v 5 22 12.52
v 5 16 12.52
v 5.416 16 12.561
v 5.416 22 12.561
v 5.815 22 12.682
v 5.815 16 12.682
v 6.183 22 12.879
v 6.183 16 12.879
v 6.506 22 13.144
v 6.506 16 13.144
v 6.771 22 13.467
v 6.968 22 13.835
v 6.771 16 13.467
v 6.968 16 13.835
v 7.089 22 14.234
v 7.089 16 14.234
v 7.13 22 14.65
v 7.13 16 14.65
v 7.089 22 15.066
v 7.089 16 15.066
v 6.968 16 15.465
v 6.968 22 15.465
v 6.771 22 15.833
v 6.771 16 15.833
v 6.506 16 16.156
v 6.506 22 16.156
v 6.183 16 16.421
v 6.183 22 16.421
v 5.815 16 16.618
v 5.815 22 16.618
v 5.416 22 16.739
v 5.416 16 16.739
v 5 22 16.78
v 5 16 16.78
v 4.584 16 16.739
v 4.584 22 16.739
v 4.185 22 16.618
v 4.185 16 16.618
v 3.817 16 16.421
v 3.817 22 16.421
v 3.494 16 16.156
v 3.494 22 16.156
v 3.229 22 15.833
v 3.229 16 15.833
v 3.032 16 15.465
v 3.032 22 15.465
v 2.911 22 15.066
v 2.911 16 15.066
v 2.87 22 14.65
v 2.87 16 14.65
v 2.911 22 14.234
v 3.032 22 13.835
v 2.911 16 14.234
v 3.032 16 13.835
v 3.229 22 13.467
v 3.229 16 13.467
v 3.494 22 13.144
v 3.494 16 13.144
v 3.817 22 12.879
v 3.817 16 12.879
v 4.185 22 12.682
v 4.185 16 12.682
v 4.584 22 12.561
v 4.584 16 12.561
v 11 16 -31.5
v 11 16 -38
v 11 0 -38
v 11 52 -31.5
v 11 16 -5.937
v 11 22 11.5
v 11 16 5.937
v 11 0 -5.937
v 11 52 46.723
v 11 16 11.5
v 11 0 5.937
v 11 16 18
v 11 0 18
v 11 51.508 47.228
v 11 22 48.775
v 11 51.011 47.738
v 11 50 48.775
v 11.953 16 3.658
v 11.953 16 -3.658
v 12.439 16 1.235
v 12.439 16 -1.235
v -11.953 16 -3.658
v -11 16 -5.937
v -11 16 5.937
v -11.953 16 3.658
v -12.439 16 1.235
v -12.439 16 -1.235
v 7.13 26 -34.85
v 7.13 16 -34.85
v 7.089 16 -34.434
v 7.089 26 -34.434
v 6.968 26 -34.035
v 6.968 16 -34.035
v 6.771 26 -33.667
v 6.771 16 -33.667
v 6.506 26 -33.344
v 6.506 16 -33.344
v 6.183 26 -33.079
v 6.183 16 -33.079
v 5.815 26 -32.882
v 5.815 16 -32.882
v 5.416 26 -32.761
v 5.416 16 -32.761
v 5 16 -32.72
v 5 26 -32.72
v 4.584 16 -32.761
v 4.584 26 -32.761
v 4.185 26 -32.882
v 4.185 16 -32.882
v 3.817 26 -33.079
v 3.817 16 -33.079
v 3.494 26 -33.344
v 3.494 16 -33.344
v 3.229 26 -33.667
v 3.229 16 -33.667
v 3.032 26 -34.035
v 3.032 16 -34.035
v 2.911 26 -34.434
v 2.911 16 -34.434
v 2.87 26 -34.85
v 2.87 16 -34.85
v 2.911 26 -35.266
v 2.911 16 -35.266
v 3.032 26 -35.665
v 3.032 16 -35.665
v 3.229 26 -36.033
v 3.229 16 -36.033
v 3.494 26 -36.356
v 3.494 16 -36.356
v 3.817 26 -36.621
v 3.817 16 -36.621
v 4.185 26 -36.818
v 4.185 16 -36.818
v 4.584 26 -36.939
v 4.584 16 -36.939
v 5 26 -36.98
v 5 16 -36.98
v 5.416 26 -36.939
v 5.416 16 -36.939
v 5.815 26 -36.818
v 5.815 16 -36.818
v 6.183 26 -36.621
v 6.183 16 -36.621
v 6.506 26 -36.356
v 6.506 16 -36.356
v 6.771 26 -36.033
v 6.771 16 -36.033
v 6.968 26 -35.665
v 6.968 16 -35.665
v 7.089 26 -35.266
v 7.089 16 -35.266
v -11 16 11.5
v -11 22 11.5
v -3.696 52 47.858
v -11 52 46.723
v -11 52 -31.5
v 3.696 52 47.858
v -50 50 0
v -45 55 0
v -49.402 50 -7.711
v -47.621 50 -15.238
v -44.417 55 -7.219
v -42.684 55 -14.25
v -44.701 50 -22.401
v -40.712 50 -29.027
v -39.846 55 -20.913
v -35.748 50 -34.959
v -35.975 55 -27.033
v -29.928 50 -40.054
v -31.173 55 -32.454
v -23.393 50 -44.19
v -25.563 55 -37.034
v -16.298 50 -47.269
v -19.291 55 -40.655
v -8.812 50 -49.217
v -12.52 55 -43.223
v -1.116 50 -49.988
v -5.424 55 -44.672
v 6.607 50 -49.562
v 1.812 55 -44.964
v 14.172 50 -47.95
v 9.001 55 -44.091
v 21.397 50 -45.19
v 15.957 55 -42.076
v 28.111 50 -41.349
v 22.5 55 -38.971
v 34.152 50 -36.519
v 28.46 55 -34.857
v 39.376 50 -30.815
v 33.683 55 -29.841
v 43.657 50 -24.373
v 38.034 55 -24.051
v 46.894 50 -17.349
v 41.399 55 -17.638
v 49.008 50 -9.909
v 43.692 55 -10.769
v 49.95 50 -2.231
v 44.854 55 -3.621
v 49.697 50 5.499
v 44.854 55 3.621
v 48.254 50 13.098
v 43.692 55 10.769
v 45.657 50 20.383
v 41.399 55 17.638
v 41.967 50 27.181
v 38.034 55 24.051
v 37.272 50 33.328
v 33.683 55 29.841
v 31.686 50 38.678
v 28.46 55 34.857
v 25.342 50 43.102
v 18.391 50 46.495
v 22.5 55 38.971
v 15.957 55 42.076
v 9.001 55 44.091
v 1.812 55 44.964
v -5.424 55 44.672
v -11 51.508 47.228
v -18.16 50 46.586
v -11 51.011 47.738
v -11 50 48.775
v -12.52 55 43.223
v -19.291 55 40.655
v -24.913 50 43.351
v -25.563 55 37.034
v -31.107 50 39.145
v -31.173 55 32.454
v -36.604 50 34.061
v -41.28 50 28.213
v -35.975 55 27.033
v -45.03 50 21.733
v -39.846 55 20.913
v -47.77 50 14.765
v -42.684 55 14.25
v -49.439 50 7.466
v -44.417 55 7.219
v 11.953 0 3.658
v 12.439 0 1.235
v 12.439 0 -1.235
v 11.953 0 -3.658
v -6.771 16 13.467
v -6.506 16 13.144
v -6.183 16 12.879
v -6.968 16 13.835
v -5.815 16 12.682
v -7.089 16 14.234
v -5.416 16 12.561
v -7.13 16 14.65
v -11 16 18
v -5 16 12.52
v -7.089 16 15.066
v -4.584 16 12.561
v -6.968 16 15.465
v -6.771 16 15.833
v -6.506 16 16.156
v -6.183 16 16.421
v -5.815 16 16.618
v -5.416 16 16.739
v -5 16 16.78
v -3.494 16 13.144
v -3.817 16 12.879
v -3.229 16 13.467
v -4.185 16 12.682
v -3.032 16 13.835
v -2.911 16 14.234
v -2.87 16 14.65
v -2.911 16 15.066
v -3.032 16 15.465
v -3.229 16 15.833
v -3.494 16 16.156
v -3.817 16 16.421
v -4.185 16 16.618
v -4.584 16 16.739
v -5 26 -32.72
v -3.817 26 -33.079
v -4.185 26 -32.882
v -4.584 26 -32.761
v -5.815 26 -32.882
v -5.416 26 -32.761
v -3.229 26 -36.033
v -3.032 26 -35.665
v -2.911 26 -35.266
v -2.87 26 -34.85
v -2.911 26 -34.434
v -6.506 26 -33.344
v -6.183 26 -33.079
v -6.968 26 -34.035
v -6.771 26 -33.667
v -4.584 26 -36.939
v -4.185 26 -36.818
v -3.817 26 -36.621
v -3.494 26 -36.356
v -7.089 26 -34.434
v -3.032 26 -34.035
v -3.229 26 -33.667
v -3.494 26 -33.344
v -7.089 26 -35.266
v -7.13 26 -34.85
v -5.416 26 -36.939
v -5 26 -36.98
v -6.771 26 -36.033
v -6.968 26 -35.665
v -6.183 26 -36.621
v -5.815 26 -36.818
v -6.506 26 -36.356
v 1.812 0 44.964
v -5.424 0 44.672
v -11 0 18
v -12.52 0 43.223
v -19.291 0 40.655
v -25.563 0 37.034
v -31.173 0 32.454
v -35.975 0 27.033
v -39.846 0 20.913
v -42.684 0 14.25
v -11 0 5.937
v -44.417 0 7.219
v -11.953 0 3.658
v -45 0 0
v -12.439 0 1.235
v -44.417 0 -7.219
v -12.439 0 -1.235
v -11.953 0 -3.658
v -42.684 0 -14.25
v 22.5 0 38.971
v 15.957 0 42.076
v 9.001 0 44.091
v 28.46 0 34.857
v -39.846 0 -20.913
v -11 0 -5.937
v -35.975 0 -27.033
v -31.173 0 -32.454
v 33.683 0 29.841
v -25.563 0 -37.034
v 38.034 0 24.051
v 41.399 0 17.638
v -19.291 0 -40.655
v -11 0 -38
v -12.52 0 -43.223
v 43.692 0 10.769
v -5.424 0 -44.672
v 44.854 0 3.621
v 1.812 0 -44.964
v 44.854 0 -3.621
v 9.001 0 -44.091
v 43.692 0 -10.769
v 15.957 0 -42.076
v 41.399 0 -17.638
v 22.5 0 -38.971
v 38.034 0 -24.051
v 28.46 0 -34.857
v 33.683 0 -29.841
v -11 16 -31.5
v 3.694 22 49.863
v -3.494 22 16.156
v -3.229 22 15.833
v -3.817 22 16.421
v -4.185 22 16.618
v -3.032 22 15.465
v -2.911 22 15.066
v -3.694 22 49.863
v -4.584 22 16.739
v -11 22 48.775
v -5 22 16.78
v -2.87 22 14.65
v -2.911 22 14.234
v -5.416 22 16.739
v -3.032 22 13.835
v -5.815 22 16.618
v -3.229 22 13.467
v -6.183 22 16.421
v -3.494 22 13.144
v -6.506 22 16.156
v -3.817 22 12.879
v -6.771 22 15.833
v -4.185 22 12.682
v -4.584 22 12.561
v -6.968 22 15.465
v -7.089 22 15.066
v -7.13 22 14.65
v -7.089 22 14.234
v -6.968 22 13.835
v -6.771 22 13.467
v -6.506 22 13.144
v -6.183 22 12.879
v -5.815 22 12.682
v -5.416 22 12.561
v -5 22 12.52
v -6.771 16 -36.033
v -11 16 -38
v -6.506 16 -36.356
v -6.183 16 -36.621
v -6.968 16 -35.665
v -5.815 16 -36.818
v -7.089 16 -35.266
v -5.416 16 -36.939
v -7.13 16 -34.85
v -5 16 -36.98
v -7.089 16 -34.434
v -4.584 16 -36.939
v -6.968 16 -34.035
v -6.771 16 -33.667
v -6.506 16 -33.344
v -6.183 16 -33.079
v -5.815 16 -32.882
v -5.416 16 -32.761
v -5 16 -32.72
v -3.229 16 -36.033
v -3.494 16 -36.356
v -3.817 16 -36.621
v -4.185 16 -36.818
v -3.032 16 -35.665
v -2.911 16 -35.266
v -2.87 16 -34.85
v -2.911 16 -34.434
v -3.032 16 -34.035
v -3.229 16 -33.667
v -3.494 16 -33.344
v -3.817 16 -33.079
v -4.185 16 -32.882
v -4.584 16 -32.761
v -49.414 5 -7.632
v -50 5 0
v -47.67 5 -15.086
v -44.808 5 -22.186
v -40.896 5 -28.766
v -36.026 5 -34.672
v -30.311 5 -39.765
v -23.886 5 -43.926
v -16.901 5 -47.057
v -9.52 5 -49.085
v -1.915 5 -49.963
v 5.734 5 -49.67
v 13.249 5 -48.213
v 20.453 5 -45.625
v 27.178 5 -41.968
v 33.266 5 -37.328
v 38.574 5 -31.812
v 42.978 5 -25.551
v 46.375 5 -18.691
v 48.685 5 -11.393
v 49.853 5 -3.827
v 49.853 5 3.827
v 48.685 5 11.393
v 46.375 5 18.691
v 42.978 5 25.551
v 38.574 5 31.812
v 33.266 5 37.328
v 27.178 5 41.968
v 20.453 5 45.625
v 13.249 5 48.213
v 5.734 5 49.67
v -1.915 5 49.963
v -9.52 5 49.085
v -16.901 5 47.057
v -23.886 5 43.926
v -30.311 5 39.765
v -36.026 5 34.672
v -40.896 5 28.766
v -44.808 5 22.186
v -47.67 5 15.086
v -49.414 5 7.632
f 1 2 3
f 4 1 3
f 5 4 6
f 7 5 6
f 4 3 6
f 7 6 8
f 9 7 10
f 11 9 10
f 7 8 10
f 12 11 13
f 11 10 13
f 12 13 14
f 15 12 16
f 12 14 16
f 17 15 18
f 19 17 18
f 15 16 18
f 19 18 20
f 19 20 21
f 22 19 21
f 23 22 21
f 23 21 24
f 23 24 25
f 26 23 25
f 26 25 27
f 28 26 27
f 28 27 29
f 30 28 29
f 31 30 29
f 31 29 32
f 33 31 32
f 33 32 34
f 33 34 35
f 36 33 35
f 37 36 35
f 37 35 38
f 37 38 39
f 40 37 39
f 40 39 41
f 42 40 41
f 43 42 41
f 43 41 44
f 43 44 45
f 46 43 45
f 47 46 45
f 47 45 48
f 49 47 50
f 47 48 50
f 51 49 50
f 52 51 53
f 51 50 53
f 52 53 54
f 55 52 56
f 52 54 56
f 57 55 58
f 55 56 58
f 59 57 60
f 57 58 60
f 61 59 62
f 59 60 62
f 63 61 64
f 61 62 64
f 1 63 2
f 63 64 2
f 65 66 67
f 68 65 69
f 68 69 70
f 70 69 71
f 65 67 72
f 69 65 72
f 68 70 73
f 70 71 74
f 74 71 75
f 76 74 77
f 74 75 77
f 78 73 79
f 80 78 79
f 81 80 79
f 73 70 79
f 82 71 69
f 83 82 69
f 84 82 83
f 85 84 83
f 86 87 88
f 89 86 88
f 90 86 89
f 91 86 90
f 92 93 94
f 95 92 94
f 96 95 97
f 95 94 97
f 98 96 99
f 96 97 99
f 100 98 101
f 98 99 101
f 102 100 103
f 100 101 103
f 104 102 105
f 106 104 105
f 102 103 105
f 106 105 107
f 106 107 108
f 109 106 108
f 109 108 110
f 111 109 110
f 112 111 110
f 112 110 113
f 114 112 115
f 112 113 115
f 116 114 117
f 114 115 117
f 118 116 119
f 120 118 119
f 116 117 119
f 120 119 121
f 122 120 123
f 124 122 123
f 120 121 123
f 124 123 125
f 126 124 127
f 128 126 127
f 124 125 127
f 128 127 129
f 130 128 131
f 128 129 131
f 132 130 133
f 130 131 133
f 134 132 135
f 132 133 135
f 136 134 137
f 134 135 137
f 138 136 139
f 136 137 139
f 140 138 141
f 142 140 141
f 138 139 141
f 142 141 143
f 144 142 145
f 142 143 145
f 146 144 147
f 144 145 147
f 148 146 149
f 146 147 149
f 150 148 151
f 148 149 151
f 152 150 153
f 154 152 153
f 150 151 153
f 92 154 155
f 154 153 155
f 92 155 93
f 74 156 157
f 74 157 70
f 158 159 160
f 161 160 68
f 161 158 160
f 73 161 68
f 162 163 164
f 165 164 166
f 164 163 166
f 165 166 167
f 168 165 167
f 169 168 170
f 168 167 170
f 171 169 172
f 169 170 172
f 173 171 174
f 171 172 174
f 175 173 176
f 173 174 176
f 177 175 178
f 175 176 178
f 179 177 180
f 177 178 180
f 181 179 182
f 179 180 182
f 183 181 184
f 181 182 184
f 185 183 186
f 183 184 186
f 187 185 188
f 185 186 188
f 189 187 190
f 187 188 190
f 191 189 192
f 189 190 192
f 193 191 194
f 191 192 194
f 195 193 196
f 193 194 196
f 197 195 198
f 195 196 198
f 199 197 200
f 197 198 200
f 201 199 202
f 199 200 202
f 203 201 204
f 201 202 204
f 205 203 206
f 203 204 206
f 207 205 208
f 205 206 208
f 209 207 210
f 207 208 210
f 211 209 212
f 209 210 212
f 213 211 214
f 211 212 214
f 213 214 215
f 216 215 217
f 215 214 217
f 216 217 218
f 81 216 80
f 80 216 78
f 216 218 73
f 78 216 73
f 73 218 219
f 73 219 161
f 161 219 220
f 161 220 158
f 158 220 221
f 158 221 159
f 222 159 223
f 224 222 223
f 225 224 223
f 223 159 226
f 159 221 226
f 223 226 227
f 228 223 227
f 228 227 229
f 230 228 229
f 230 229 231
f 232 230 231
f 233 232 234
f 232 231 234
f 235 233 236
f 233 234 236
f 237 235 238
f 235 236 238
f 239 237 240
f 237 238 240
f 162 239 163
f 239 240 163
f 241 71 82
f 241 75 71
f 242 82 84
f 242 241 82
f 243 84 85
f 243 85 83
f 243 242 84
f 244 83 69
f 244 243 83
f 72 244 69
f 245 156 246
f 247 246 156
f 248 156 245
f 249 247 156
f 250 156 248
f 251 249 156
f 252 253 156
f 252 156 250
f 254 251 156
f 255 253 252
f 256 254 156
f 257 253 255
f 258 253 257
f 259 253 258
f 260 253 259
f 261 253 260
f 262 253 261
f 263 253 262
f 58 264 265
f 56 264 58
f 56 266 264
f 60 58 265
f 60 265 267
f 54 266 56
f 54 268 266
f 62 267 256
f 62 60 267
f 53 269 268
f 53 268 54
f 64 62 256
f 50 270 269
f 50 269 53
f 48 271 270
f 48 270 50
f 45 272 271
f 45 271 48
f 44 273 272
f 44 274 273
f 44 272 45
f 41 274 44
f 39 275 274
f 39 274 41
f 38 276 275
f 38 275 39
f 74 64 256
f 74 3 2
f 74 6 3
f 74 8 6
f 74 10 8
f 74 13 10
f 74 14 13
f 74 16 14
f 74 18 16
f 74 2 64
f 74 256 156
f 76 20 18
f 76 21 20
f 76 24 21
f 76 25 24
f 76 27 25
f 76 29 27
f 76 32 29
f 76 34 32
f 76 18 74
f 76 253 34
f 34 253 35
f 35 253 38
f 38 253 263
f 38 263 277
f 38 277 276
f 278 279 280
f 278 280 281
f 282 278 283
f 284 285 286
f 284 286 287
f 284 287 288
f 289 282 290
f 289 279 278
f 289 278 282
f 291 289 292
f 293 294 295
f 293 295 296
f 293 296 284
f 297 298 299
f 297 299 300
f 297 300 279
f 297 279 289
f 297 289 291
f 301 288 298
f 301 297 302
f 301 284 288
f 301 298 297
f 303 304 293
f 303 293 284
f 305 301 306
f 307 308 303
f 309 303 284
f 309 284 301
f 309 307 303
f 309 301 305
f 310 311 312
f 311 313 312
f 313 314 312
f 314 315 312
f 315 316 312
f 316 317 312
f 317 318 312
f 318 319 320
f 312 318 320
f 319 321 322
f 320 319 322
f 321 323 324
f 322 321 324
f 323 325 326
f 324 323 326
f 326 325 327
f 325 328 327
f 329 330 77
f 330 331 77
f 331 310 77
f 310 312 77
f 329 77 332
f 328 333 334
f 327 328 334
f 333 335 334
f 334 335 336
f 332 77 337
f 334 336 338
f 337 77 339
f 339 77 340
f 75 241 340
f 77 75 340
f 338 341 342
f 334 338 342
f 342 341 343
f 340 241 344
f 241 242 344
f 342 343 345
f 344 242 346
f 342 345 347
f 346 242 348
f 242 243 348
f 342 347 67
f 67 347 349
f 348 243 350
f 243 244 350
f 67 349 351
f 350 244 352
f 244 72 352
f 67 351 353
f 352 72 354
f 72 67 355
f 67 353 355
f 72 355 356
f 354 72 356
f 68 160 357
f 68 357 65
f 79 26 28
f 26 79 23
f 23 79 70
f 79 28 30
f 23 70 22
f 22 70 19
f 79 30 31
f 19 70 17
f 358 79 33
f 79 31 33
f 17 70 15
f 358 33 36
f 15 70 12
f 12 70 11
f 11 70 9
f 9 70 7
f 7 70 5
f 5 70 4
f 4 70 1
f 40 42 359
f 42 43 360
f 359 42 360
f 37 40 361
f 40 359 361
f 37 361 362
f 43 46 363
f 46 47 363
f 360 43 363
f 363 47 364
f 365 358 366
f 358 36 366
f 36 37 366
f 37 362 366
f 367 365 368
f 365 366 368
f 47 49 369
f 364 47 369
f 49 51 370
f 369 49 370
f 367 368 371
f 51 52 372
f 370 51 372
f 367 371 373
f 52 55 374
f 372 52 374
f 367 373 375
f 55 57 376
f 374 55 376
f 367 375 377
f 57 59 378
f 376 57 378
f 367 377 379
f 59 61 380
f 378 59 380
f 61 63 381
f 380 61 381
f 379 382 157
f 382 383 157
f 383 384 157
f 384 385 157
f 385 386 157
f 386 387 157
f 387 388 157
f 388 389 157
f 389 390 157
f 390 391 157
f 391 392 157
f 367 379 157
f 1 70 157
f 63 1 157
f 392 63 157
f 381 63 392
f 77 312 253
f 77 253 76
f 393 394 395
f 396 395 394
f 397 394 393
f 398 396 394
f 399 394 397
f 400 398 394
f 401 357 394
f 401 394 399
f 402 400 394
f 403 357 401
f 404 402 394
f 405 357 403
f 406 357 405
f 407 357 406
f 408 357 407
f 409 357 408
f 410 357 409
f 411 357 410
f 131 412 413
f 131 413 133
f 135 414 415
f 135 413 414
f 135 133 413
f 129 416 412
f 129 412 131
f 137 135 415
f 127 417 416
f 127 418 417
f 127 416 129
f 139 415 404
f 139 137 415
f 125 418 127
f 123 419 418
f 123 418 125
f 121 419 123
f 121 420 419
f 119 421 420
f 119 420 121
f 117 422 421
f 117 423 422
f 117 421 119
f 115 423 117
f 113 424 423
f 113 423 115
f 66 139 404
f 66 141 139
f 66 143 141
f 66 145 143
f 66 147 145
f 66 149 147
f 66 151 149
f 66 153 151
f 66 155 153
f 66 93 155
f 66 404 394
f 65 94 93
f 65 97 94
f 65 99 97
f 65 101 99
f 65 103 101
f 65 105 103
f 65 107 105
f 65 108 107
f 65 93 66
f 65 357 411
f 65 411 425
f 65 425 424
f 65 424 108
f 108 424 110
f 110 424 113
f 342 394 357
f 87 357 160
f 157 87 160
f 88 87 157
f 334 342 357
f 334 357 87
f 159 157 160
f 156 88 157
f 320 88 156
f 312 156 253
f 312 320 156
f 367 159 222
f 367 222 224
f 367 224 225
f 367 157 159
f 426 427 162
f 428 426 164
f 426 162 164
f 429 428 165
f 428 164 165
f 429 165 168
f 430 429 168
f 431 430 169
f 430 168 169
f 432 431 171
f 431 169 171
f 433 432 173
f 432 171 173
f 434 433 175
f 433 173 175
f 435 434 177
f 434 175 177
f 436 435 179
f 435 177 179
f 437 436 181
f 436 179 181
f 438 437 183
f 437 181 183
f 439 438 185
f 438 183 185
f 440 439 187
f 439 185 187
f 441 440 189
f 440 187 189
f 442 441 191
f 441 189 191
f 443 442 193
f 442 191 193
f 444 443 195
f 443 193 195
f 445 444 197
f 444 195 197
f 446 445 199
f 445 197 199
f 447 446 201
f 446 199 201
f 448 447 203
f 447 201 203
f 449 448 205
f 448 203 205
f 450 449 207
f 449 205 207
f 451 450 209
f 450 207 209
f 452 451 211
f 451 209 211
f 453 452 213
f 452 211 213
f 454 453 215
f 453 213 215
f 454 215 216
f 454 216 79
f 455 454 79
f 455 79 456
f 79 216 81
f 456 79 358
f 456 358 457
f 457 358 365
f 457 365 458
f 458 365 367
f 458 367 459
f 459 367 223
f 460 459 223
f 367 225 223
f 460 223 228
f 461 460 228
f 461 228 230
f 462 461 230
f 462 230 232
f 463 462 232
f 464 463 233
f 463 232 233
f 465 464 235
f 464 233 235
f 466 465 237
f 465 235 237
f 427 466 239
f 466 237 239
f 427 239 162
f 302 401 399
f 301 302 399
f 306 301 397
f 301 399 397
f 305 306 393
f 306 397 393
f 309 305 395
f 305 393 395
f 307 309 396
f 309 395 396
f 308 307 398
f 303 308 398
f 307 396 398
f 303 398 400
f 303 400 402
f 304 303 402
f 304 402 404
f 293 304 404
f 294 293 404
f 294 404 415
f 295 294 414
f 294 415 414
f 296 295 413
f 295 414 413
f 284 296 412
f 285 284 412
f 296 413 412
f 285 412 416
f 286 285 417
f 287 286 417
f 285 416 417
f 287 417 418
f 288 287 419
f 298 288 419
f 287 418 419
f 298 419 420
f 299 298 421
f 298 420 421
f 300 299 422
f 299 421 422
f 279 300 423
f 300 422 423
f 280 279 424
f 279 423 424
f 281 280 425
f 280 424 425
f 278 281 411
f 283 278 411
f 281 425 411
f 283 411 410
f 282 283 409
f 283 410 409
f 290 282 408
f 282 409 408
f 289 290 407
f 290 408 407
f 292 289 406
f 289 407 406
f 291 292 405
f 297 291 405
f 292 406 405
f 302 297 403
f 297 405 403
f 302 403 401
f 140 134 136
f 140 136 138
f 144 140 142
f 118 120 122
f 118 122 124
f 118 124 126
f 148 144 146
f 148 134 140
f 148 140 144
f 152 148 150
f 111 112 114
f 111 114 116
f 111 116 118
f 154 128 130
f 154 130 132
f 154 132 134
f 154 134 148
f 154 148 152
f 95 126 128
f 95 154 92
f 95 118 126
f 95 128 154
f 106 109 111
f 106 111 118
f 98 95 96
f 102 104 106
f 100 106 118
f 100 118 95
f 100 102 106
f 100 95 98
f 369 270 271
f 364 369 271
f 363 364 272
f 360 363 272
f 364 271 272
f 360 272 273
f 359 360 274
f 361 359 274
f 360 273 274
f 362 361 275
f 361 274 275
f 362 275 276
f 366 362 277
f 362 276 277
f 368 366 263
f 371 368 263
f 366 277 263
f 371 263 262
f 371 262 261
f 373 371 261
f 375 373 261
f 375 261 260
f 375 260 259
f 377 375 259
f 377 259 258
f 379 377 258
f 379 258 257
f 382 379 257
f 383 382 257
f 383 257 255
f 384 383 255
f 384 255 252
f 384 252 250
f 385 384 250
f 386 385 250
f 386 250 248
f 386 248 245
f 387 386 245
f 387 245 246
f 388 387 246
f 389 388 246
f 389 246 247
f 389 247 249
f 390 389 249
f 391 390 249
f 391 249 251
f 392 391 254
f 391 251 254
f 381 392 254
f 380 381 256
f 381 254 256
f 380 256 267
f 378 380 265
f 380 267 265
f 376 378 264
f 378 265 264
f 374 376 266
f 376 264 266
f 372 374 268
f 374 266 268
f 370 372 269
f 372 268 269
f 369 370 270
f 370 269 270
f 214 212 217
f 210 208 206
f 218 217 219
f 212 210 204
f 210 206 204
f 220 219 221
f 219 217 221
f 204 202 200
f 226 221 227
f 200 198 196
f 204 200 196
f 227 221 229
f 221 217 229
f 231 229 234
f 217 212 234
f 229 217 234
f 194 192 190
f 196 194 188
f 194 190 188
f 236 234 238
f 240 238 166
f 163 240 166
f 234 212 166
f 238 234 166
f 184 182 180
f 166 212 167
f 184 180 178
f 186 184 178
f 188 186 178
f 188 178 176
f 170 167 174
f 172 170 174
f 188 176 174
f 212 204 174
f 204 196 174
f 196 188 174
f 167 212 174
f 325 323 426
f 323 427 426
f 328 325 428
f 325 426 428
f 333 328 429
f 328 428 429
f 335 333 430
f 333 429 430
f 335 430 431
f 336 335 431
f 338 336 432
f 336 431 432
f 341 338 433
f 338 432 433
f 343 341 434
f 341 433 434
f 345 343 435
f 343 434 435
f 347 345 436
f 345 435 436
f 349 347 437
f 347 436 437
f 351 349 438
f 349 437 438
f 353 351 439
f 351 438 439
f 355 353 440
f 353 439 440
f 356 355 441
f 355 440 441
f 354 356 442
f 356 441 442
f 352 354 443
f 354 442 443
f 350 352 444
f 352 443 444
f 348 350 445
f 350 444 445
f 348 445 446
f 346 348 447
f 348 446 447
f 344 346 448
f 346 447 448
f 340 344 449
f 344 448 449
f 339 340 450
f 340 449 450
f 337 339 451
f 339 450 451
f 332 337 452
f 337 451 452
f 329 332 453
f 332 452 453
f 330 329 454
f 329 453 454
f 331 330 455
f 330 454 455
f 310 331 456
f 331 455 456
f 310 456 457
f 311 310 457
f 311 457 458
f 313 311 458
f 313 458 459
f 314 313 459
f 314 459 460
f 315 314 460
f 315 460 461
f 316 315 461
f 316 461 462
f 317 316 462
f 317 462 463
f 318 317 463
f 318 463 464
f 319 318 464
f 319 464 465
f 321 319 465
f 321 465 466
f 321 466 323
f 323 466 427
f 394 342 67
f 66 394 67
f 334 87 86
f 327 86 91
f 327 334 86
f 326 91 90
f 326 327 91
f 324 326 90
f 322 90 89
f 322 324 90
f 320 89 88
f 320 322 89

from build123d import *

# Parameters (mm, degrees)
SKETCH2_W          = 22
SKETCH2_H          = 56
CUT_EXTRUDE1_DEPTH = 16
SKETCH3_W          = 22
SKETCH3_H          = 43
CUT_EXTRUDE2_DEPTH = 36
SKETCH5_R          = 12.5
CUT_EXTRUDE4_DEPTH = 16
SKETCH6_W          = 22
SKETCH6_H          = 30
CUT_EXTRUDE5_DEPTH = 97.474089786
SKETCH4_R          = 2.13
CUT_EXTRUDE3_DEPTH = 10


with BuildPart() as part:
    # Sketch1 → Revolve1 (revolve)
    with BuildSketch(Plane.XY, mode=Mode.PRIVATE) as revolve1_sk:
        Polygon((0, 0), (45, 0), (50, 5), (50, 50), (45, 55), (0, 55), align=None)
    revolve(revolve1_sk.sketch.rotate(Axis((0, 55, 0), (0, -1, 0)), 180), axis=Axis((0, 55, 0), (0, -1, 0)))

    # Sketch2 → Cut-Extrude1 (cut)
    with BuildSketch(Plane.XZ):
        with Locations((0, -10)):
            Rectangle(SKETCH2_W, SKETCH2_H)
    extrude(amount=-CUT_EXTRUDE1_DEPTH, mode=Mode.SUBTRACT)

    # Sketch3 → Cut-Extrude2 (cut)
    with BuildSketch(Plane.XZ.offset(-16)):
        with Locations((0, -10)):
            Rectangle(SKETCH3_W, SKETCH3_H)
    extrude(amount=-CUT_EXTRUDE2_DEPTH, mode=Mode.SUBTRACT)

    # Sketch5 → Cut-Extrude4 (cut)
    with BuildSketch(Plane(origin=(0, 0, 0), x_dir=(1, 0, 0), z_dir=(0, 1, 0))):
        Circle(SKETCH5_R)
    extrude(amount=CUT_EXTRUDE4_DEPTH, mode=Mode.SUBTRACT)

    # Sketch6 → Cut-Extrude5 (cut, through all)
    with BuildSketch(Plane(origin=(0, 0, 11.5), x_dir=(-1, 0, 0), z_dir=(0, 0, -1))):
        with Locations((0, 37)):
            Rectangle(SKETCH6_W, SKETCH6_H)
    extrude(amount=-CUT_EXTRUDE5_DEPTH, mode=Mode.SUBTRACT)

    # Sketch4 → Cut-Extrude3 (cut)
    with BuildSketch(Plane.XZ.offset(-16)):
        with Locations((-5, 14.65)):
            Circle(SKETCH4_R)
        with Locations(Location((5, 14.65, 0), (0, 0, 270))):
            Circle(SKETCH4_R)
        with Locations((5, -34.85)):
            Circle(SKETCH4_R)
        with Locations(Location((-5, -34.85, 0), (0, 0, 180))):
            Circle(SKETCH4_R)
    extrude(amount=-CUT_EXTRUDE3_DEPTH, mode=Mode.SUBTRACT)


solid = part.part
